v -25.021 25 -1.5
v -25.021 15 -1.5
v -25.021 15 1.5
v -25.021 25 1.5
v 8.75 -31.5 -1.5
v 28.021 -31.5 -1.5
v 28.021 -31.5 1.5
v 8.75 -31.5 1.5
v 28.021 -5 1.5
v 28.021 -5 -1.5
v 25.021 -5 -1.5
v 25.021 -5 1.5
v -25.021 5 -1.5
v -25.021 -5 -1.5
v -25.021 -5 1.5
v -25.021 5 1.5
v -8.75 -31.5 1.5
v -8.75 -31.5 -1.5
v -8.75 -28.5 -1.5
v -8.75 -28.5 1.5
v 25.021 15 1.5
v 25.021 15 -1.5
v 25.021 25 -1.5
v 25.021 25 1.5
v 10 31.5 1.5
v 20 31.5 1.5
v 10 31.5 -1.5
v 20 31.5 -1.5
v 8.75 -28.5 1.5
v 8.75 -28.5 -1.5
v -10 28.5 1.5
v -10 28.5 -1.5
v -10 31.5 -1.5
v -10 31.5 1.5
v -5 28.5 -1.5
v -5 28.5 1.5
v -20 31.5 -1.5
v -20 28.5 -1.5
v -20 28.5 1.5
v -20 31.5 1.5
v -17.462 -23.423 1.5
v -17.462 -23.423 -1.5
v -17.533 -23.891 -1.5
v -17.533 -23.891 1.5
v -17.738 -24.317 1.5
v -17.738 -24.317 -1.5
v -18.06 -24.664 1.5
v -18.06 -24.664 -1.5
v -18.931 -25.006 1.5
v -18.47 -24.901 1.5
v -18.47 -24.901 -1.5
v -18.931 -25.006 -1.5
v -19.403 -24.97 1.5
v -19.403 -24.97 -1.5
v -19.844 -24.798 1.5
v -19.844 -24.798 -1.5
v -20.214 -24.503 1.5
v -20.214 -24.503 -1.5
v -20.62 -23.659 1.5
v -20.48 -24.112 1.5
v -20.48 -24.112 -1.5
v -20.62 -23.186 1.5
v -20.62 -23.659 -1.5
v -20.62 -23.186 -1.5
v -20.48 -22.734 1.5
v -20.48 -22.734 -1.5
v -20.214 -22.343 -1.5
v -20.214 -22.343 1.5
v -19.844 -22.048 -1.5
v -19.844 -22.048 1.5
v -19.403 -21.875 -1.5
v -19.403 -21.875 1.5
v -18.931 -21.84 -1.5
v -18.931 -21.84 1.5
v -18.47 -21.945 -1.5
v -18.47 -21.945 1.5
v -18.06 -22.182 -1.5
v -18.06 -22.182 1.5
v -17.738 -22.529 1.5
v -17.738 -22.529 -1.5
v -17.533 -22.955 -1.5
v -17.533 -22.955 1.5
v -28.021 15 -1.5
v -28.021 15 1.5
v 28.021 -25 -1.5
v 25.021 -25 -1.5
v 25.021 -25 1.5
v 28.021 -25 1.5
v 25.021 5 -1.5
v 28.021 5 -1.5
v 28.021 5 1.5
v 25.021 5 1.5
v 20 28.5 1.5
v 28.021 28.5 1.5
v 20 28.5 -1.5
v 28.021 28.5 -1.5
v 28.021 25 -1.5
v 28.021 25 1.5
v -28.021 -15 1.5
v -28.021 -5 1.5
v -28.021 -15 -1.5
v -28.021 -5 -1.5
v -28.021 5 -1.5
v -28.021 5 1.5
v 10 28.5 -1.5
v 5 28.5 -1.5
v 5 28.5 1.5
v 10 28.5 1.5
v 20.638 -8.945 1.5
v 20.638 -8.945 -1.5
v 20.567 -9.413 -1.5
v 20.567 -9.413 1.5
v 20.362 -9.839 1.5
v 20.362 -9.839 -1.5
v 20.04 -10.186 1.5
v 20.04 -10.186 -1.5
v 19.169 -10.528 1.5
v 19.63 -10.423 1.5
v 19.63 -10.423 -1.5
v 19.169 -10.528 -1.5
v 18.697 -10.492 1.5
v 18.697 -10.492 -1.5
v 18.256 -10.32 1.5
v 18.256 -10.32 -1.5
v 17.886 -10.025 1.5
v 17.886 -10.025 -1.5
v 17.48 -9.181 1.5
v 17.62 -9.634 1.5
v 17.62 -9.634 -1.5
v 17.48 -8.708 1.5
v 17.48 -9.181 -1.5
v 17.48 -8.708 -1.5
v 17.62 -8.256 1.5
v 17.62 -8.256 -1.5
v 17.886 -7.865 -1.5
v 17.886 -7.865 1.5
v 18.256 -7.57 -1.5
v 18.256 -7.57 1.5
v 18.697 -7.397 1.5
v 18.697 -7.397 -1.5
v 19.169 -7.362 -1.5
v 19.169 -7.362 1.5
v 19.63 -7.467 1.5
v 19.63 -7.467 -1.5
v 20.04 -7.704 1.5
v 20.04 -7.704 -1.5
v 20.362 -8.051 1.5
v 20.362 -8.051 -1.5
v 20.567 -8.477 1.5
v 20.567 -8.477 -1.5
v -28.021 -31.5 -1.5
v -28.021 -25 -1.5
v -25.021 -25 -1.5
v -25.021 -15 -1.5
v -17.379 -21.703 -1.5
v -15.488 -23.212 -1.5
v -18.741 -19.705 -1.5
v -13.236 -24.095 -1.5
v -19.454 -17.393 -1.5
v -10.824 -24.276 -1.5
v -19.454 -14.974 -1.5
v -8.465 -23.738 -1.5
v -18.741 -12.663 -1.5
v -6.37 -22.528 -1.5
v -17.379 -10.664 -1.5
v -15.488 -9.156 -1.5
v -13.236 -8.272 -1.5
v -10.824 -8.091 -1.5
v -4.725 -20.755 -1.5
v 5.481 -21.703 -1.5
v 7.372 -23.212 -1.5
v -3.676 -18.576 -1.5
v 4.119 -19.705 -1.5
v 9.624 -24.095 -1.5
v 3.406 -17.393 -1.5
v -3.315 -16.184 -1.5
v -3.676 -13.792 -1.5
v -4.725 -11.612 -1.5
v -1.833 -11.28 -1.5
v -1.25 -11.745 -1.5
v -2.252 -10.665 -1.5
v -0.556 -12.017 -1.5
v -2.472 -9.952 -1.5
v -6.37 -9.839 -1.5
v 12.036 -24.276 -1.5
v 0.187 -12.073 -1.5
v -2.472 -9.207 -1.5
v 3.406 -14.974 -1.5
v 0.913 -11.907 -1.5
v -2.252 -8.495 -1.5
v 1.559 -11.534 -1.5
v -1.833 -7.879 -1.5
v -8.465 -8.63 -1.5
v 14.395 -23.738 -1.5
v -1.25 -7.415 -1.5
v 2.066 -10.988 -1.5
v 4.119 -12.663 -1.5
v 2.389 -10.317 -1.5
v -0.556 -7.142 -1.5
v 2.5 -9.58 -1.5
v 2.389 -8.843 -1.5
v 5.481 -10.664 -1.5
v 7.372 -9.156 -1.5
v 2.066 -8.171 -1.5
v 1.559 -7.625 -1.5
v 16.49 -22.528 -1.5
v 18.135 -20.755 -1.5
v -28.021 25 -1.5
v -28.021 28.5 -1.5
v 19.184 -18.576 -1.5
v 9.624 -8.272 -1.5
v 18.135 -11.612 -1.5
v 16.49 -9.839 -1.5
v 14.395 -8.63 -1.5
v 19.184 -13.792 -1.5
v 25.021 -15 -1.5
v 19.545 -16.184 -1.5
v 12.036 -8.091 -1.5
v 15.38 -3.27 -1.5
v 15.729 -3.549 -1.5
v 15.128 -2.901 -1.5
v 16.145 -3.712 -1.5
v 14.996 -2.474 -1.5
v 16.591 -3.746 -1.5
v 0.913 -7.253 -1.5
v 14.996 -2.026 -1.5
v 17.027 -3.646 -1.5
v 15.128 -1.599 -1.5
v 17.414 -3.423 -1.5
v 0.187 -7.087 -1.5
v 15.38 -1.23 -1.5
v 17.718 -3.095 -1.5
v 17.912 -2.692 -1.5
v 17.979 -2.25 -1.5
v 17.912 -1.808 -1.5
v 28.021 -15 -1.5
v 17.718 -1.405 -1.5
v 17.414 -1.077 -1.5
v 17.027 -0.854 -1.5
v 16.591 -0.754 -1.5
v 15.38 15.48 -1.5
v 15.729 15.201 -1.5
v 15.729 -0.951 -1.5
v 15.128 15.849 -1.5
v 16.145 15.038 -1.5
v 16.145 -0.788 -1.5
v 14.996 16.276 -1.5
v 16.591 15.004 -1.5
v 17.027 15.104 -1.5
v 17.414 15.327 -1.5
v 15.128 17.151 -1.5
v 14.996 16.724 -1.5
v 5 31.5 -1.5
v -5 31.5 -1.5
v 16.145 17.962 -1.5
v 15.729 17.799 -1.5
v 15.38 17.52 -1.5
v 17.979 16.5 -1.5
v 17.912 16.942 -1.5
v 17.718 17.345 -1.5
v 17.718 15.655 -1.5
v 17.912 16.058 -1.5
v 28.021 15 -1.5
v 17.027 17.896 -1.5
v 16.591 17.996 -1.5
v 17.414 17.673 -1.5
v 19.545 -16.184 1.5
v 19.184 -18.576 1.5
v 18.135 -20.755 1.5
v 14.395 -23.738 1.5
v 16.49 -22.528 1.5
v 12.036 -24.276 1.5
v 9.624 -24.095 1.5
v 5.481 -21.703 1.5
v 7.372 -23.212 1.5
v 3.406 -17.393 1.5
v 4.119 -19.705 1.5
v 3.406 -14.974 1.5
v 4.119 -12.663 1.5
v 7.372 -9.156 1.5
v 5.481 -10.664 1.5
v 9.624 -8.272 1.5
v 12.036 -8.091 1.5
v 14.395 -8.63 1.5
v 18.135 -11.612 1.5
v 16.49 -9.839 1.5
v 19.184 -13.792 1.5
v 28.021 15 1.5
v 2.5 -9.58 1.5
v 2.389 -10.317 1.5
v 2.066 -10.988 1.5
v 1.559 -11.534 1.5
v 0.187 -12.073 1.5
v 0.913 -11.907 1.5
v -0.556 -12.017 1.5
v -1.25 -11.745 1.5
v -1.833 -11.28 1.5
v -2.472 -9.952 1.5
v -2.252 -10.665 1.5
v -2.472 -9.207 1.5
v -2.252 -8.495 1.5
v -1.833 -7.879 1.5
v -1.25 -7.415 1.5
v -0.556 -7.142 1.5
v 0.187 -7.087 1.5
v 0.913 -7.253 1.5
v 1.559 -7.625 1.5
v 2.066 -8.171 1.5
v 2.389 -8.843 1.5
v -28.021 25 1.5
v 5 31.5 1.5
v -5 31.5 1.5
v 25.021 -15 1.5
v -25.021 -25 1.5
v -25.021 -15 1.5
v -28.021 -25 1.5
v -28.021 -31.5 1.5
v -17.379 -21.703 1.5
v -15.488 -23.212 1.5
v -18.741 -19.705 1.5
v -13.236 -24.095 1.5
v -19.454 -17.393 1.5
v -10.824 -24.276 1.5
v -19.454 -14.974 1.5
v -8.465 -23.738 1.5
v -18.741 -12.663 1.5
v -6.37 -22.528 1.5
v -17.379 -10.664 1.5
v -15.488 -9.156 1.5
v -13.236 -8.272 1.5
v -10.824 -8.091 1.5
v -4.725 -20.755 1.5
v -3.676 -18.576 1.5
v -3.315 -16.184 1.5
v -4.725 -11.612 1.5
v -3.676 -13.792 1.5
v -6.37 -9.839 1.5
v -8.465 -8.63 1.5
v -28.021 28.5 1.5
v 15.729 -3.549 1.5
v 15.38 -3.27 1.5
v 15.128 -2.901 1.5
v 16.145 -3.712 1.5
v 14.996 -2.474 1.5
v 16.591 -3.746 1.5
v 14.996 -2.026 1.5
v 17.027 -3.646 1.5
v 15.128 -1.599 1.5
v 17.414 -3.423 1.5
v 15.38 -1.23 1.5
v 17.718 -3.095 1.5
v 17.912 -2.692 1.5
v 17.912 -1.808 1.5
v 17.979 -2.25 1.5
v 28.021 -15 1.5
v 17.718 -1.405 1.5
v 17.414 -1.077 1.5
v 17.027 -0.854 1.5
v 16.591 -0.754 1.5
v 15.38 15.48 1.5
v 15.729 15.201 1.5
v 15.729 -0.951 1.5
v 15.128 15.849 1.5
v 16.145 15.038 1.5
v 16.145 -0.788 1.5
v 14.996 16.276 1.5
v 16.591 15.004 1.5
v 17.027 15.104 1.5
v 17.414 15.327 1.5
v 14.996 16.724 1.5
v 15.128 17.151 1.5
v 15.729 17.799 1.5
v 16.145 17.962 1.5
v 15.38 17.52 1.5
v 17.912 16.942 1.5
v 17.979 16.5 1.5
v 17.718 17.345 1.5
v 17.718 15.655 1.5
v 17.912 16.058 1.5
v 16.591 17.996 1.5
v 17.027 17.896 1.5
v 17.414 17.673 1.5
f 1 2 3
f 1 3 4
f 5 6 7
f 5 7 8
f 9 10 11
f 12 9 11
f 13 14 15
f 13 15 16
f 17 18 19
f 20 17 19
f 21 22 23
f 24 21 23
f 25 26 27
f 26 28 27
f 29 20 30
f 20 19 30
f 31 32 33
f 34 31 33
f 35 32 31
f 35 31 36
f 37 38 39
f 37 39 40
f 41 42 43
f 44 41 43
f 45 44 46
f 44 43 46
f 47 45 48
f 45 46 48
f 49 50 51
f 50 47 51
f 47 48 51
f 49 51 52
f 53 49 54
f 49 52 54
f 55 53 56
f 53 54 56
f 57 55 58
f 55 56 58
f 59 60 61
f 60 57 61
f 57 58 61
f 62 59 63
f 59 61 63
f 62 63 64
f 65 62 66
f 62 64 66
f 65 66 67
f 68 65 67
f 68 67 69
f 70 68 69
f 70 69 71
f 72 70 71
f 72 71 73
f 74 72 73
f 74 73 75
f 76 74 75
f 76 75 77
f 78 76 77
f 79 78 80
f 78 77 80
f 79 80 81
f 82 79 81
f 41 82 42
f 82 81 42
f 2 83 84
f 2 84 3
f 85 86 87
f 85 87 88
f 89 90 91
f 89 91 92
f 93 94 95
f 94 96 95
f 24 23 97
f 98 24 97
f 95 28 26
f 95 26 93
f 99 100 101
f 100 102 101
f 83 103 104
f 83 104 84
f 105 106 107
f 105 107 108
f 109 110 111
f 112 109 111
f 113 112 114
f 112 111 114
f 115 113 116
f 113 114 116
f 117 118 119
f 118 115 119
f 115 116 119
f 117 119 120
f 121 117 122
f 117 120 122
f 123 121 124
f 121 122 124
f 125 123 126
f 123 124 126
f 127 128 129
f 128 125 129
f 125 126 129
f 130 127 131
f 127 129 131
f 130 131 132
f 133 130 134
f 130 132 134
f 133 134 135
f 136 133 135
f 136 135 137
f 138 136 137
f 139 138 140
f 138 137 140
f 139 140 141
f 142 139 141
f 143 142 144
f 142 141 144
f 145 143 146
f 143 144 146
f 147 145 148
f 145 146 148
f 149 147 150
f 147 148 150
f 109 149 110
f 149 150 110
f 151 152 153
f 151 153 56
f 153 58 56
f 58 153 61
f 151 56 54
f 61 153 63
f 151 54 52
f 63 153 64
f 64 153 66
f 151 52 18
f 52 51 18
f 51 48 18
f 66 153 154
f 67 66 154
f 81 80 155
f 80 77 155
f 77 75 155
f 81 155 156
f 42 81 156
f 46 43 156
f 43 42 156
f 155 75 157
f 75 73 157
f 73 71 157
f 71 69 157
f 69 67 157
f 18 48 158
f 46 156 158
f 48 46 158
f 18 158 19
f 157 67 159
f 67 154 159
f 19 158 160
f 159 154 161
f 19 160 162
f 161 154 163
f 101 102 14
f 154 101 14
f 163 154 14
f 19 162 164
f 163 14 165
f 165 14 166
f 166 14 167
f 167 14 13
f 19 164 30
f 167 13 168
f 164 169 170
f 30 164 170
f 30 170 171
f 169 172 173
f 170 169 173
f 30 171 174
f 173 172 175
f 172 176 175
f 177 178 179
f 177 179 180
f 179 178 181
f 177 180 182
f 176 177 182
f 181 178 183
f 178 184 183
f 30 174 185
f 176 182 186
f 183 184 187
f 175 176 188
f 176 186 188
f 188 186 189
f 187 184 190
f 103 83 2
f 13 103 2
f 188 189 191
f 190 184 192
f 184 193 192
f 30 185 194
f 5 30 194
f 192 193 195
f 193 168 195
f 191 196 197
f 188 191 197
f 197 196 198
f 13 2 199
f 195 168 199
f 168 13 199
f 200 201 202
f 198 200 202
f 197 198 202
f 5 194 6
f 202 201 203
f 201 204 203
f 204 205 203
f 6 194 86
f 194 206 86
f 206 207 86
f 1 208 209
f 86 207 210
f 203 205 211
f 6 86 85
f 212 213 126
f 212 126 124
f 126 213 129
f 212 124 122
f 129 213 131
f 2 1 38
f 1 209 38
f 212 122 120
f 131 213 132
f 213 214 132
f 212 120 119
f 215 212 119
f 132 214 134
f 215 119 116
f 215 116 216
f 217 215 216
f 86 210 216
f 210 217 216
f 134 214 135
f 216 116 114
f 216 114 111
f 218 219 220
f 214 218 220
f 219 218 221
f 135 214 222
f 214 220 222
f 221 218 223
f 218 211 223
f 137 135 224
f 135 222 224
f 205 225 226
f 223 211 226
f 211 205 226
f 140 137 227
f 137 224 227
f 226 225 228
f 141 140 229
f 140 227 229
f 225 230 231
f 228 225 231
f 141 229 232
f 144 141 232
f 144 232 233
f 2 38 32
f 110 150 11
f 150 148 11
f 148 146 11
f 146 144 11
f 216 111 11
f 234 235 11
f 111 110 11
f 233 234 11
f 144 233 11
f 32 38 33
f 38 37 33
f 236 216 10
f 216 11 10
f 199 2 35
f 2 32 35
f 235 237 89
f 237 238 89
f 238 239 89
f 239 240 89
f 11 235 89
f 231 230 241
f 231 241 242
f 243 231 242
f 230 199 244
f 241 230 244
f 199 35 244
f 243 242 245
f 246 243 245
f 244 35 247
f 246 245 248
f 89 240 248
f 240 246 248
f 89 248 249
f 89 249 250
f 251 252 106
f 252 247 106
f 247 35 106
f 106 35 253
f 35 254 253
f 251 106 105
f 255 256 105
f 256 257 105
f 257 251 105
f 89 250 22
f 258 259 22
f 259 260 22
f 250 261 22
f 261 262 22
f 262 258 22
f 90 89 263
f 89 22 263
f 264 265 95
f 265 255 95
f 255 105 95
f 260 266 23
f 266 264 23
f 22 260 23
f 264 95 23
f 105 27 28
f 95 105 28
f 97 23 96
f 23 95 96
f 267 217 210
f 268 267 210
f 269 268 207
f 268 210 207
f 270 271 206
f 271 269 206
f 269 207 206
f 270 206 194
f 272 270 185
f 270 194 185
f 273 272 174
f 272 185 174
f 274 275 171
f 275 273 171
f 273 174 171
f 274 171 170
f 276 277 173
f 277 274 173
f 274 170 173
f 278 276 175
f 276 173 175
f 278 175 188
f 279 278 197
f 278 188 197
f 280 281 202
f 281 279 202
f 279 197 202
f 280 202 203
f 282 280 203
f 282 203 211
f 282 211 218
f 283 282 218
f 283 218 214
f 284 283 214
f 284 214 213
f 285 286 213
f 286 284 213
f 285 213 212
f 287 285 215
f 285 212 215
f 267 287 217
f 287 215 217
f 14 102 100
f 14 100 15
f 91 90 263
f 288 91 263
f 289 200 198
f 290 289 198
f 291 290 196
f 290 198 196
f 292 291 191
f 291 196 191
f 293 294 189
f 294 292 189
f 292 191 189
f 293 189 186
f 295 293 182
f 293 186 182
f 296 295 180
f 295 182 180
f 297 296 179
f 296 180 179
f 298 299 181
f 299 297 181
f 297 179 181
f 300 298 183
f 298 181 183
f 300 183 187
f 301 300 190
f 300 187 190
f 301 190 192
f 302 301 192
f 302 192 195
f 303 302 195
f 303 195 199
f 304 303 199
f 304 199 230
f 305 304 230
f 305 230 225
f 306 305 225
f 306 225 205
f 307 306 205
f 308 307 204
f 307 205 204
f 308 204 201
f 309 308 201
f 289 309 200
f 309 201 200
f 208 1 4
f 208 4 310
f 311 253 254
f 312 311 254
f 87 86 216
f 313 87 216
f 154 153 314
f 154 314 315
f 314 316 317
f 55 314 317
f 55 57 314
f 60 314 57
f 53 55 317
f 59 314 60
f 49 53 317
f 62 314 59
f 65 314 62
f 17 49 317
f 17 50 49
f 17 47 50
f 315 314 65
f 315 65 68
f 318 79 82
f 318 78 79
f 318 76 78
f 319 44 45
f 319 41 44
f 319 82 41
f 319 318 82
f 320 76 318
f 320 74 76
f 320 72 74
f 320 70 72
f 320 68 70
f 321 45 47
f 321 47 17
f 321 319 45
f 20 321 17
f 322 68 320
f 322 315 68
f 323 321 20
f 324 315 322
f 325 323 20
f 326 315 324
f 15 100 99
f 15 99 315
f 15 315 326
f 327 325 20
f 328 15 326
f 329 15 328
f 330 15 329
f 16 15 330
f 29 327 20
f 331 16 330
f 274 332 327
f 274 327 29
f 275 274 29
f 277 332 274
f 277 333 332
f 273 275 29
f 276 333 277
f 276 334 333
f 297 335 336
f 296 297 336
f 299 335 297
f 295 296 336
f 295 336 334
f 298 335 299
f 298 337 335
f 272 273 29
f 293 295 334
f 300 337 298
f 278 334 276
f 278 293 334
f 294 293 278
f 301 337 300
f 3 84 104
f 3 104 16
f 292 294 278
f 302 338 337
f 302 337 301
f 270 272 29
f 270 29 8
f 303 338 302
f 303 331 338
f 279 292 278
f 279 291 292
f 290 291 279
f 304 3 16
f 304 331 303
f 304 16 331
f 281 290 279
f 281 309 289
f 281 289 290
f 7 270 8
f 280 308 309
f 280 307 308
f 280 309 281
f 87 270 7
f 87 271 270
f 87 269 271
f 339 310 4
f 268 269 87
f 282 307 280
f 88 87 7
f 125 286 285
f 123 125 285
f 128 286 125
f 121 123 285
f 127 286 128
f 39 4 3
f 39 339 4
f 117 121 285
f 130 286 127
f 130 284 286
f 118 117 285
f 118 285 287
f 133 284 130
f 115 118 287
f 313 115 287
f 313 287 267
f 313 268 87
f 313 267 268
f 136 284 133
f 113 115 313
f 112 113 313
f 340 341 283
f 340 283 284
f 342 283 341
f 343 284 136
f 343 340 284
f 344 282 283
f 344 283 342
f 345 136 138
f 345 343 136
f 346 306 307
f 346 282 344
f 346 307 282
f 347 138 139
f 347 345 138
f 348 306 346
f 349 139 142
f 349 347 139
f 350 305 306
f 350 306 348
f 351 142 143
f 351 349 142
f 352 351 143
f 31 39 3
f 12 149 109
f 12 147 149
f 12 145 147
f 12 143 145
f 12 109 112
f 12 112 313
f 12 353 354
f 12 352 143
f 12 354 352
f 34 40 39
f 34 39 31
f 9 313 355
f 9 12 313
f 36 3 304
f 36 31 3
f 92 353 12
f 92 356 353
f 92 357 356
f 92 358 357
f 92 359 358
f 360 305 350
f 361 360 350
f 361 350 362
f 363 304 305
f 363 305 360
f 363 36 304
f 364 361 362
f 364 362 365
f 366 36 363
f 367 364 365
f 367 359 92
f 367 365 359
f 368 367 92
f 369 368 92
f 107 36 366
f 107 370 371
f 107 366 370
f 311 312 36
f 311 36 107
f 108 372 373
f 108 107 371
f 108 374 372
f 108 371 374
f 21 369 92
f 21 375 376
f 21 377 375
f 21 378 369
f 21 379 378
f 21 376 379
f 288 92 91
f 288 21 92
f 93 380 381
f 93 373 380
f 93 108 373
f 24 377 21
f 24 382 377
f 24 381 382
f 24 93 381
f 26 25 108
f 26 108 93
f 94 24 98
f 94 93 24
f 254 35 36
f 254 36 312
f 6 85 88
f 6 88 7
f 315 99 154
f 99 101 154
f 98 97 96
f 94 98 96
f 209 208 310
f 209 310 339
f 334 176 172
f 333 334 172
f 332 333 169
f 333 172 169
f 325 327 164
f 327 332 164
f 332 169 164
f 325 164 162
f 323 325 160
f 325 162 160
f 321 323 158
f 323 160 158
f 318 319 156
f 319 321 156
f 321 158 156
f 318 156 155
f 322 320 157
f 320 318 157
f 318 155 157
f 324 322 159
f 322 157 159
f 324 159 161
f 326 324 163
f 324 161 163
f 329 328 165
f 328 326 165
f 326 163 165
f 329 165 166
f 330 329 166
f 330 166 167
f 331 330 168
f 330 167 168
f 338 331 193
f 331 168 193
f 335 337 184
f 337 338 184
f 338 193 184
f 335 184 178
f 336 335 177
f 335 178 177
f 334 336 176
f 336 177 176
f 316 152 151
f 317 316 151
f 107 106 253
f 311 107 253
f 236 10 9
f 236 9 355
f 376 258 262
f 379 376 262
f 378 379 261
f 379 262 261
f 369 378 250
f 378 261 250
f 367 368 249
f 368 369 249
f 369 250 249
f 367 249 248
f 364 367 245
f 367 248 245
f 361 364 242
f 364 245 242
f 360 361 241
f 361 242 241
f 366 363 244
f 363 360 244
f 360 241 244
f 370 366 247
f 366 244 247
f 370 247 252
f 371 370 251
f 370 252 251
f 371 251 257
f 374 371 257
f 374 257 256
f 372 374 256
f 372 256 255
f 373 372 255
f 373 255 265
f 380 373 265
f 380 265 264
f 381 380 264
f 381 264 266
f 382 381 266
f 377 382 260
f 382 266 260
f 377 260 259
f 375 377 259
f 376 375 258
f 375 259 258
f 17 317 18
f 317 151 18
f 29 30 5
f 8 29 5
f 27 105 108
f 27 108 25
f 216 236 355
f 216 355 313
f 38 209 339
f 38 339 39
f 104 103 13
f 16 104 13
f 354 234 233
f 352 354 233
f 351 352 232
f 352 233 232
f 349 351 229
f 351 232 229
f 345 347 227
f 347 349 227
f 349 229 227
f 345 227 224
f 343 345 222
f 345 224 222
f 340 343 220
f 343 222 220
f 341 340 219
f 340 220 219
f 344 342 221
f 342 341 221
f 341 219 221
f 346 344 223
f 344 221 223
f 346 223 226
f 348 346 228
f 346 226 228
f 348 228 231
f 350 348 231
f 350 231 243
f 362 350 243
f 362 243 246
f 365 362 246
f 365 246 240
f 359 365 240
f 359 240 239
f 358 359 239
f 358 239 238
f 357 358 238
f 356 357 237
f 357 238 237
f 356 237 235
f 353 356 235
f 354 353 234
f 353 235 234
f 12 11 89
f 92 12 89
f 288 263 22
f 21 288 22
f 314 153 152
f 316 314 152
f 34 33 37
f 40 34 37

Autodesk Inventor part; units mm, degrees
ref_plane "YZ Plane" through (0, 0, 0) normal (1, 0, 0) x (0, 1, 0)
ref_plane "XZ Plane" through (0, 0, 0) normal (0, 1, 0) x (-1, 0, 0)
ref_plane "XY Plane" through (0, 0, 0) normal (0, 0, 1) x (1, 0, 0)
sketch "Sketch1" plane through (0, 0, 0) normal (0, 0, 1) x (1, 0, 0)
  circle A0 centre (16.4791, 16.5) radius 1.5
  circle A1 centre (16.4791, -2.25) radius 1.5
  line L0 (8.75, -28.5) -> (8.75, -31.5)
  line L1 (25.0209, -31.5) -> (8.75, -31.5)
  line L2 (-8.75, -28.5) -> (8.75, -28.5)
  circle A2 centre (11.43, -16.1838) radius 8.115
  circle A3 centre (19.05, -8.9448) radius 1.5875
  circle A4 centre (-19.05, -23.4228) radius 1.5875
  circle A5 centre (0, -9.5798) radius 2.5
  circle A6 centre (-11.43, -16.1838) radius 8.115
  line L3 (0, 8) -> (0, 18) construction
  line L4 (0, 18) -> (8.75, 18) construction
  line L5 (5, 31.5) -> (-5, 31.5)
  line L6 (-5, 28.5) -> (5, 31.5) construction
  line L7 (5, 28.5) -> (-5, 31.5) construction
  line L8 (-5, 28.5) -> (5, 28.5) construction
  line L9 (20, 31.5) -> (10, 31.5)
  line L10 (-10, 31.5) -> (-20, 31.5)
  line L11 (5, 31.5) -> (-5, 31.5)
  line L12 (-10, 28.5) -> (-10, 31.5)
  line L13 (-20, 28.5) -> (-20, 31.5)
  line L14 (10, 28.5) -> (10, 31.5)
  line L15 (20, 31.5) -> (20, 28.5)
  line L16 (-10, 28.5) -> (-5, 28.5)
  line L17 (5, 28.5) -> (10, 28.5)
  line L18 (-28.0209, -5) -> (-28.0209, -15)
  line L19 (-28.0209, -15) -> (-25.0209, -15)
  line L20 (-25.0209, -25) -> (-28.0209, -25)
  line L21 (-28.0209, -25) -> (-28.0209, -31.5)
  line L22 (-28.0209, -5) -> (-25.0209, -5)
  line L23 (-28.0209, 5) -> (-25.0209, 5)
  line L24 (-28.0209, 5) -> (-28.0209, 15)
  line L25 (-28.0209, 15) -> (-25.0209, 15)
  line L26 (-25.0209, 25) -> (-28.0209, 25)
  line L27 (-28.0209, 25) -> (-28.0209, 28.5)
  line L28 (-28.0209, 28.5) -> (-20, 28.5)
  line L29 (-25.0209, 15) -> (-25.0209, 25)
  line L30 (-25.0209, -25) -> (-25.0209, -15)
  line L31 (-25.0209, -5) -> (-25.0209, 5)
  line L32 (28.0209, -5) -> (28.0209, -15)
  line L33 (28.0209, -15) -> (25.0209, -15)
  line L34 (25.0209, -25) -> (28.0209, -25)
  line L35 (28.0209, -25) -> (28.0209, -31.5)
  line L36 (28.0209, -31.5) -> (25.0209, -31.5)
  line L37 (28.0209, -5) -> (25.0209, -5)
  line L38 (28.0209, 5) -> (25.0209, 5)
  line L39 (28.0209, 5) -> (28.0209, 15)
  line L40 (28.0209, 15) -> (25.0209, 15)
  line L41 (25.0209, 25) -> (28.0209, 25)
  line L42 (28.0209, 25) -> (28.0209, 28.5)
  line L43 (28.0209, 28.5) -> (20, 28.5)
  line L44 (25.0209, 15) -> (25.0209, 25)
  line L45 (25.0209, -25) -> (25.0209, -15)
  line L46 (25.0209, -5) -> (25.0209, 5)
  line L47 (-8.75, -31.5) -> (-8.75, -28.5)
  line L48 (-28.0209, -31.5) -> (-8.75, -31.5)
  line L49 (-5, 28.5) -> (-5, 31.5)
  line L50 (5, 28.5) -> (5, 31.5)
  point P0 (0, 0)
  point P1 (0, 30)
  dimension "d2" = 3
  dimension "d5" = 15
  dimension "d8" = 15
  dimension "d12" = 5
  dimension "d13" = 10
  dimension "d16" = 3
  dimension "d17" = 3
extrude "Extrusion2" add sketch "Sketch1" along normal mid plane 3
properties part number "srfdiagkiri"
